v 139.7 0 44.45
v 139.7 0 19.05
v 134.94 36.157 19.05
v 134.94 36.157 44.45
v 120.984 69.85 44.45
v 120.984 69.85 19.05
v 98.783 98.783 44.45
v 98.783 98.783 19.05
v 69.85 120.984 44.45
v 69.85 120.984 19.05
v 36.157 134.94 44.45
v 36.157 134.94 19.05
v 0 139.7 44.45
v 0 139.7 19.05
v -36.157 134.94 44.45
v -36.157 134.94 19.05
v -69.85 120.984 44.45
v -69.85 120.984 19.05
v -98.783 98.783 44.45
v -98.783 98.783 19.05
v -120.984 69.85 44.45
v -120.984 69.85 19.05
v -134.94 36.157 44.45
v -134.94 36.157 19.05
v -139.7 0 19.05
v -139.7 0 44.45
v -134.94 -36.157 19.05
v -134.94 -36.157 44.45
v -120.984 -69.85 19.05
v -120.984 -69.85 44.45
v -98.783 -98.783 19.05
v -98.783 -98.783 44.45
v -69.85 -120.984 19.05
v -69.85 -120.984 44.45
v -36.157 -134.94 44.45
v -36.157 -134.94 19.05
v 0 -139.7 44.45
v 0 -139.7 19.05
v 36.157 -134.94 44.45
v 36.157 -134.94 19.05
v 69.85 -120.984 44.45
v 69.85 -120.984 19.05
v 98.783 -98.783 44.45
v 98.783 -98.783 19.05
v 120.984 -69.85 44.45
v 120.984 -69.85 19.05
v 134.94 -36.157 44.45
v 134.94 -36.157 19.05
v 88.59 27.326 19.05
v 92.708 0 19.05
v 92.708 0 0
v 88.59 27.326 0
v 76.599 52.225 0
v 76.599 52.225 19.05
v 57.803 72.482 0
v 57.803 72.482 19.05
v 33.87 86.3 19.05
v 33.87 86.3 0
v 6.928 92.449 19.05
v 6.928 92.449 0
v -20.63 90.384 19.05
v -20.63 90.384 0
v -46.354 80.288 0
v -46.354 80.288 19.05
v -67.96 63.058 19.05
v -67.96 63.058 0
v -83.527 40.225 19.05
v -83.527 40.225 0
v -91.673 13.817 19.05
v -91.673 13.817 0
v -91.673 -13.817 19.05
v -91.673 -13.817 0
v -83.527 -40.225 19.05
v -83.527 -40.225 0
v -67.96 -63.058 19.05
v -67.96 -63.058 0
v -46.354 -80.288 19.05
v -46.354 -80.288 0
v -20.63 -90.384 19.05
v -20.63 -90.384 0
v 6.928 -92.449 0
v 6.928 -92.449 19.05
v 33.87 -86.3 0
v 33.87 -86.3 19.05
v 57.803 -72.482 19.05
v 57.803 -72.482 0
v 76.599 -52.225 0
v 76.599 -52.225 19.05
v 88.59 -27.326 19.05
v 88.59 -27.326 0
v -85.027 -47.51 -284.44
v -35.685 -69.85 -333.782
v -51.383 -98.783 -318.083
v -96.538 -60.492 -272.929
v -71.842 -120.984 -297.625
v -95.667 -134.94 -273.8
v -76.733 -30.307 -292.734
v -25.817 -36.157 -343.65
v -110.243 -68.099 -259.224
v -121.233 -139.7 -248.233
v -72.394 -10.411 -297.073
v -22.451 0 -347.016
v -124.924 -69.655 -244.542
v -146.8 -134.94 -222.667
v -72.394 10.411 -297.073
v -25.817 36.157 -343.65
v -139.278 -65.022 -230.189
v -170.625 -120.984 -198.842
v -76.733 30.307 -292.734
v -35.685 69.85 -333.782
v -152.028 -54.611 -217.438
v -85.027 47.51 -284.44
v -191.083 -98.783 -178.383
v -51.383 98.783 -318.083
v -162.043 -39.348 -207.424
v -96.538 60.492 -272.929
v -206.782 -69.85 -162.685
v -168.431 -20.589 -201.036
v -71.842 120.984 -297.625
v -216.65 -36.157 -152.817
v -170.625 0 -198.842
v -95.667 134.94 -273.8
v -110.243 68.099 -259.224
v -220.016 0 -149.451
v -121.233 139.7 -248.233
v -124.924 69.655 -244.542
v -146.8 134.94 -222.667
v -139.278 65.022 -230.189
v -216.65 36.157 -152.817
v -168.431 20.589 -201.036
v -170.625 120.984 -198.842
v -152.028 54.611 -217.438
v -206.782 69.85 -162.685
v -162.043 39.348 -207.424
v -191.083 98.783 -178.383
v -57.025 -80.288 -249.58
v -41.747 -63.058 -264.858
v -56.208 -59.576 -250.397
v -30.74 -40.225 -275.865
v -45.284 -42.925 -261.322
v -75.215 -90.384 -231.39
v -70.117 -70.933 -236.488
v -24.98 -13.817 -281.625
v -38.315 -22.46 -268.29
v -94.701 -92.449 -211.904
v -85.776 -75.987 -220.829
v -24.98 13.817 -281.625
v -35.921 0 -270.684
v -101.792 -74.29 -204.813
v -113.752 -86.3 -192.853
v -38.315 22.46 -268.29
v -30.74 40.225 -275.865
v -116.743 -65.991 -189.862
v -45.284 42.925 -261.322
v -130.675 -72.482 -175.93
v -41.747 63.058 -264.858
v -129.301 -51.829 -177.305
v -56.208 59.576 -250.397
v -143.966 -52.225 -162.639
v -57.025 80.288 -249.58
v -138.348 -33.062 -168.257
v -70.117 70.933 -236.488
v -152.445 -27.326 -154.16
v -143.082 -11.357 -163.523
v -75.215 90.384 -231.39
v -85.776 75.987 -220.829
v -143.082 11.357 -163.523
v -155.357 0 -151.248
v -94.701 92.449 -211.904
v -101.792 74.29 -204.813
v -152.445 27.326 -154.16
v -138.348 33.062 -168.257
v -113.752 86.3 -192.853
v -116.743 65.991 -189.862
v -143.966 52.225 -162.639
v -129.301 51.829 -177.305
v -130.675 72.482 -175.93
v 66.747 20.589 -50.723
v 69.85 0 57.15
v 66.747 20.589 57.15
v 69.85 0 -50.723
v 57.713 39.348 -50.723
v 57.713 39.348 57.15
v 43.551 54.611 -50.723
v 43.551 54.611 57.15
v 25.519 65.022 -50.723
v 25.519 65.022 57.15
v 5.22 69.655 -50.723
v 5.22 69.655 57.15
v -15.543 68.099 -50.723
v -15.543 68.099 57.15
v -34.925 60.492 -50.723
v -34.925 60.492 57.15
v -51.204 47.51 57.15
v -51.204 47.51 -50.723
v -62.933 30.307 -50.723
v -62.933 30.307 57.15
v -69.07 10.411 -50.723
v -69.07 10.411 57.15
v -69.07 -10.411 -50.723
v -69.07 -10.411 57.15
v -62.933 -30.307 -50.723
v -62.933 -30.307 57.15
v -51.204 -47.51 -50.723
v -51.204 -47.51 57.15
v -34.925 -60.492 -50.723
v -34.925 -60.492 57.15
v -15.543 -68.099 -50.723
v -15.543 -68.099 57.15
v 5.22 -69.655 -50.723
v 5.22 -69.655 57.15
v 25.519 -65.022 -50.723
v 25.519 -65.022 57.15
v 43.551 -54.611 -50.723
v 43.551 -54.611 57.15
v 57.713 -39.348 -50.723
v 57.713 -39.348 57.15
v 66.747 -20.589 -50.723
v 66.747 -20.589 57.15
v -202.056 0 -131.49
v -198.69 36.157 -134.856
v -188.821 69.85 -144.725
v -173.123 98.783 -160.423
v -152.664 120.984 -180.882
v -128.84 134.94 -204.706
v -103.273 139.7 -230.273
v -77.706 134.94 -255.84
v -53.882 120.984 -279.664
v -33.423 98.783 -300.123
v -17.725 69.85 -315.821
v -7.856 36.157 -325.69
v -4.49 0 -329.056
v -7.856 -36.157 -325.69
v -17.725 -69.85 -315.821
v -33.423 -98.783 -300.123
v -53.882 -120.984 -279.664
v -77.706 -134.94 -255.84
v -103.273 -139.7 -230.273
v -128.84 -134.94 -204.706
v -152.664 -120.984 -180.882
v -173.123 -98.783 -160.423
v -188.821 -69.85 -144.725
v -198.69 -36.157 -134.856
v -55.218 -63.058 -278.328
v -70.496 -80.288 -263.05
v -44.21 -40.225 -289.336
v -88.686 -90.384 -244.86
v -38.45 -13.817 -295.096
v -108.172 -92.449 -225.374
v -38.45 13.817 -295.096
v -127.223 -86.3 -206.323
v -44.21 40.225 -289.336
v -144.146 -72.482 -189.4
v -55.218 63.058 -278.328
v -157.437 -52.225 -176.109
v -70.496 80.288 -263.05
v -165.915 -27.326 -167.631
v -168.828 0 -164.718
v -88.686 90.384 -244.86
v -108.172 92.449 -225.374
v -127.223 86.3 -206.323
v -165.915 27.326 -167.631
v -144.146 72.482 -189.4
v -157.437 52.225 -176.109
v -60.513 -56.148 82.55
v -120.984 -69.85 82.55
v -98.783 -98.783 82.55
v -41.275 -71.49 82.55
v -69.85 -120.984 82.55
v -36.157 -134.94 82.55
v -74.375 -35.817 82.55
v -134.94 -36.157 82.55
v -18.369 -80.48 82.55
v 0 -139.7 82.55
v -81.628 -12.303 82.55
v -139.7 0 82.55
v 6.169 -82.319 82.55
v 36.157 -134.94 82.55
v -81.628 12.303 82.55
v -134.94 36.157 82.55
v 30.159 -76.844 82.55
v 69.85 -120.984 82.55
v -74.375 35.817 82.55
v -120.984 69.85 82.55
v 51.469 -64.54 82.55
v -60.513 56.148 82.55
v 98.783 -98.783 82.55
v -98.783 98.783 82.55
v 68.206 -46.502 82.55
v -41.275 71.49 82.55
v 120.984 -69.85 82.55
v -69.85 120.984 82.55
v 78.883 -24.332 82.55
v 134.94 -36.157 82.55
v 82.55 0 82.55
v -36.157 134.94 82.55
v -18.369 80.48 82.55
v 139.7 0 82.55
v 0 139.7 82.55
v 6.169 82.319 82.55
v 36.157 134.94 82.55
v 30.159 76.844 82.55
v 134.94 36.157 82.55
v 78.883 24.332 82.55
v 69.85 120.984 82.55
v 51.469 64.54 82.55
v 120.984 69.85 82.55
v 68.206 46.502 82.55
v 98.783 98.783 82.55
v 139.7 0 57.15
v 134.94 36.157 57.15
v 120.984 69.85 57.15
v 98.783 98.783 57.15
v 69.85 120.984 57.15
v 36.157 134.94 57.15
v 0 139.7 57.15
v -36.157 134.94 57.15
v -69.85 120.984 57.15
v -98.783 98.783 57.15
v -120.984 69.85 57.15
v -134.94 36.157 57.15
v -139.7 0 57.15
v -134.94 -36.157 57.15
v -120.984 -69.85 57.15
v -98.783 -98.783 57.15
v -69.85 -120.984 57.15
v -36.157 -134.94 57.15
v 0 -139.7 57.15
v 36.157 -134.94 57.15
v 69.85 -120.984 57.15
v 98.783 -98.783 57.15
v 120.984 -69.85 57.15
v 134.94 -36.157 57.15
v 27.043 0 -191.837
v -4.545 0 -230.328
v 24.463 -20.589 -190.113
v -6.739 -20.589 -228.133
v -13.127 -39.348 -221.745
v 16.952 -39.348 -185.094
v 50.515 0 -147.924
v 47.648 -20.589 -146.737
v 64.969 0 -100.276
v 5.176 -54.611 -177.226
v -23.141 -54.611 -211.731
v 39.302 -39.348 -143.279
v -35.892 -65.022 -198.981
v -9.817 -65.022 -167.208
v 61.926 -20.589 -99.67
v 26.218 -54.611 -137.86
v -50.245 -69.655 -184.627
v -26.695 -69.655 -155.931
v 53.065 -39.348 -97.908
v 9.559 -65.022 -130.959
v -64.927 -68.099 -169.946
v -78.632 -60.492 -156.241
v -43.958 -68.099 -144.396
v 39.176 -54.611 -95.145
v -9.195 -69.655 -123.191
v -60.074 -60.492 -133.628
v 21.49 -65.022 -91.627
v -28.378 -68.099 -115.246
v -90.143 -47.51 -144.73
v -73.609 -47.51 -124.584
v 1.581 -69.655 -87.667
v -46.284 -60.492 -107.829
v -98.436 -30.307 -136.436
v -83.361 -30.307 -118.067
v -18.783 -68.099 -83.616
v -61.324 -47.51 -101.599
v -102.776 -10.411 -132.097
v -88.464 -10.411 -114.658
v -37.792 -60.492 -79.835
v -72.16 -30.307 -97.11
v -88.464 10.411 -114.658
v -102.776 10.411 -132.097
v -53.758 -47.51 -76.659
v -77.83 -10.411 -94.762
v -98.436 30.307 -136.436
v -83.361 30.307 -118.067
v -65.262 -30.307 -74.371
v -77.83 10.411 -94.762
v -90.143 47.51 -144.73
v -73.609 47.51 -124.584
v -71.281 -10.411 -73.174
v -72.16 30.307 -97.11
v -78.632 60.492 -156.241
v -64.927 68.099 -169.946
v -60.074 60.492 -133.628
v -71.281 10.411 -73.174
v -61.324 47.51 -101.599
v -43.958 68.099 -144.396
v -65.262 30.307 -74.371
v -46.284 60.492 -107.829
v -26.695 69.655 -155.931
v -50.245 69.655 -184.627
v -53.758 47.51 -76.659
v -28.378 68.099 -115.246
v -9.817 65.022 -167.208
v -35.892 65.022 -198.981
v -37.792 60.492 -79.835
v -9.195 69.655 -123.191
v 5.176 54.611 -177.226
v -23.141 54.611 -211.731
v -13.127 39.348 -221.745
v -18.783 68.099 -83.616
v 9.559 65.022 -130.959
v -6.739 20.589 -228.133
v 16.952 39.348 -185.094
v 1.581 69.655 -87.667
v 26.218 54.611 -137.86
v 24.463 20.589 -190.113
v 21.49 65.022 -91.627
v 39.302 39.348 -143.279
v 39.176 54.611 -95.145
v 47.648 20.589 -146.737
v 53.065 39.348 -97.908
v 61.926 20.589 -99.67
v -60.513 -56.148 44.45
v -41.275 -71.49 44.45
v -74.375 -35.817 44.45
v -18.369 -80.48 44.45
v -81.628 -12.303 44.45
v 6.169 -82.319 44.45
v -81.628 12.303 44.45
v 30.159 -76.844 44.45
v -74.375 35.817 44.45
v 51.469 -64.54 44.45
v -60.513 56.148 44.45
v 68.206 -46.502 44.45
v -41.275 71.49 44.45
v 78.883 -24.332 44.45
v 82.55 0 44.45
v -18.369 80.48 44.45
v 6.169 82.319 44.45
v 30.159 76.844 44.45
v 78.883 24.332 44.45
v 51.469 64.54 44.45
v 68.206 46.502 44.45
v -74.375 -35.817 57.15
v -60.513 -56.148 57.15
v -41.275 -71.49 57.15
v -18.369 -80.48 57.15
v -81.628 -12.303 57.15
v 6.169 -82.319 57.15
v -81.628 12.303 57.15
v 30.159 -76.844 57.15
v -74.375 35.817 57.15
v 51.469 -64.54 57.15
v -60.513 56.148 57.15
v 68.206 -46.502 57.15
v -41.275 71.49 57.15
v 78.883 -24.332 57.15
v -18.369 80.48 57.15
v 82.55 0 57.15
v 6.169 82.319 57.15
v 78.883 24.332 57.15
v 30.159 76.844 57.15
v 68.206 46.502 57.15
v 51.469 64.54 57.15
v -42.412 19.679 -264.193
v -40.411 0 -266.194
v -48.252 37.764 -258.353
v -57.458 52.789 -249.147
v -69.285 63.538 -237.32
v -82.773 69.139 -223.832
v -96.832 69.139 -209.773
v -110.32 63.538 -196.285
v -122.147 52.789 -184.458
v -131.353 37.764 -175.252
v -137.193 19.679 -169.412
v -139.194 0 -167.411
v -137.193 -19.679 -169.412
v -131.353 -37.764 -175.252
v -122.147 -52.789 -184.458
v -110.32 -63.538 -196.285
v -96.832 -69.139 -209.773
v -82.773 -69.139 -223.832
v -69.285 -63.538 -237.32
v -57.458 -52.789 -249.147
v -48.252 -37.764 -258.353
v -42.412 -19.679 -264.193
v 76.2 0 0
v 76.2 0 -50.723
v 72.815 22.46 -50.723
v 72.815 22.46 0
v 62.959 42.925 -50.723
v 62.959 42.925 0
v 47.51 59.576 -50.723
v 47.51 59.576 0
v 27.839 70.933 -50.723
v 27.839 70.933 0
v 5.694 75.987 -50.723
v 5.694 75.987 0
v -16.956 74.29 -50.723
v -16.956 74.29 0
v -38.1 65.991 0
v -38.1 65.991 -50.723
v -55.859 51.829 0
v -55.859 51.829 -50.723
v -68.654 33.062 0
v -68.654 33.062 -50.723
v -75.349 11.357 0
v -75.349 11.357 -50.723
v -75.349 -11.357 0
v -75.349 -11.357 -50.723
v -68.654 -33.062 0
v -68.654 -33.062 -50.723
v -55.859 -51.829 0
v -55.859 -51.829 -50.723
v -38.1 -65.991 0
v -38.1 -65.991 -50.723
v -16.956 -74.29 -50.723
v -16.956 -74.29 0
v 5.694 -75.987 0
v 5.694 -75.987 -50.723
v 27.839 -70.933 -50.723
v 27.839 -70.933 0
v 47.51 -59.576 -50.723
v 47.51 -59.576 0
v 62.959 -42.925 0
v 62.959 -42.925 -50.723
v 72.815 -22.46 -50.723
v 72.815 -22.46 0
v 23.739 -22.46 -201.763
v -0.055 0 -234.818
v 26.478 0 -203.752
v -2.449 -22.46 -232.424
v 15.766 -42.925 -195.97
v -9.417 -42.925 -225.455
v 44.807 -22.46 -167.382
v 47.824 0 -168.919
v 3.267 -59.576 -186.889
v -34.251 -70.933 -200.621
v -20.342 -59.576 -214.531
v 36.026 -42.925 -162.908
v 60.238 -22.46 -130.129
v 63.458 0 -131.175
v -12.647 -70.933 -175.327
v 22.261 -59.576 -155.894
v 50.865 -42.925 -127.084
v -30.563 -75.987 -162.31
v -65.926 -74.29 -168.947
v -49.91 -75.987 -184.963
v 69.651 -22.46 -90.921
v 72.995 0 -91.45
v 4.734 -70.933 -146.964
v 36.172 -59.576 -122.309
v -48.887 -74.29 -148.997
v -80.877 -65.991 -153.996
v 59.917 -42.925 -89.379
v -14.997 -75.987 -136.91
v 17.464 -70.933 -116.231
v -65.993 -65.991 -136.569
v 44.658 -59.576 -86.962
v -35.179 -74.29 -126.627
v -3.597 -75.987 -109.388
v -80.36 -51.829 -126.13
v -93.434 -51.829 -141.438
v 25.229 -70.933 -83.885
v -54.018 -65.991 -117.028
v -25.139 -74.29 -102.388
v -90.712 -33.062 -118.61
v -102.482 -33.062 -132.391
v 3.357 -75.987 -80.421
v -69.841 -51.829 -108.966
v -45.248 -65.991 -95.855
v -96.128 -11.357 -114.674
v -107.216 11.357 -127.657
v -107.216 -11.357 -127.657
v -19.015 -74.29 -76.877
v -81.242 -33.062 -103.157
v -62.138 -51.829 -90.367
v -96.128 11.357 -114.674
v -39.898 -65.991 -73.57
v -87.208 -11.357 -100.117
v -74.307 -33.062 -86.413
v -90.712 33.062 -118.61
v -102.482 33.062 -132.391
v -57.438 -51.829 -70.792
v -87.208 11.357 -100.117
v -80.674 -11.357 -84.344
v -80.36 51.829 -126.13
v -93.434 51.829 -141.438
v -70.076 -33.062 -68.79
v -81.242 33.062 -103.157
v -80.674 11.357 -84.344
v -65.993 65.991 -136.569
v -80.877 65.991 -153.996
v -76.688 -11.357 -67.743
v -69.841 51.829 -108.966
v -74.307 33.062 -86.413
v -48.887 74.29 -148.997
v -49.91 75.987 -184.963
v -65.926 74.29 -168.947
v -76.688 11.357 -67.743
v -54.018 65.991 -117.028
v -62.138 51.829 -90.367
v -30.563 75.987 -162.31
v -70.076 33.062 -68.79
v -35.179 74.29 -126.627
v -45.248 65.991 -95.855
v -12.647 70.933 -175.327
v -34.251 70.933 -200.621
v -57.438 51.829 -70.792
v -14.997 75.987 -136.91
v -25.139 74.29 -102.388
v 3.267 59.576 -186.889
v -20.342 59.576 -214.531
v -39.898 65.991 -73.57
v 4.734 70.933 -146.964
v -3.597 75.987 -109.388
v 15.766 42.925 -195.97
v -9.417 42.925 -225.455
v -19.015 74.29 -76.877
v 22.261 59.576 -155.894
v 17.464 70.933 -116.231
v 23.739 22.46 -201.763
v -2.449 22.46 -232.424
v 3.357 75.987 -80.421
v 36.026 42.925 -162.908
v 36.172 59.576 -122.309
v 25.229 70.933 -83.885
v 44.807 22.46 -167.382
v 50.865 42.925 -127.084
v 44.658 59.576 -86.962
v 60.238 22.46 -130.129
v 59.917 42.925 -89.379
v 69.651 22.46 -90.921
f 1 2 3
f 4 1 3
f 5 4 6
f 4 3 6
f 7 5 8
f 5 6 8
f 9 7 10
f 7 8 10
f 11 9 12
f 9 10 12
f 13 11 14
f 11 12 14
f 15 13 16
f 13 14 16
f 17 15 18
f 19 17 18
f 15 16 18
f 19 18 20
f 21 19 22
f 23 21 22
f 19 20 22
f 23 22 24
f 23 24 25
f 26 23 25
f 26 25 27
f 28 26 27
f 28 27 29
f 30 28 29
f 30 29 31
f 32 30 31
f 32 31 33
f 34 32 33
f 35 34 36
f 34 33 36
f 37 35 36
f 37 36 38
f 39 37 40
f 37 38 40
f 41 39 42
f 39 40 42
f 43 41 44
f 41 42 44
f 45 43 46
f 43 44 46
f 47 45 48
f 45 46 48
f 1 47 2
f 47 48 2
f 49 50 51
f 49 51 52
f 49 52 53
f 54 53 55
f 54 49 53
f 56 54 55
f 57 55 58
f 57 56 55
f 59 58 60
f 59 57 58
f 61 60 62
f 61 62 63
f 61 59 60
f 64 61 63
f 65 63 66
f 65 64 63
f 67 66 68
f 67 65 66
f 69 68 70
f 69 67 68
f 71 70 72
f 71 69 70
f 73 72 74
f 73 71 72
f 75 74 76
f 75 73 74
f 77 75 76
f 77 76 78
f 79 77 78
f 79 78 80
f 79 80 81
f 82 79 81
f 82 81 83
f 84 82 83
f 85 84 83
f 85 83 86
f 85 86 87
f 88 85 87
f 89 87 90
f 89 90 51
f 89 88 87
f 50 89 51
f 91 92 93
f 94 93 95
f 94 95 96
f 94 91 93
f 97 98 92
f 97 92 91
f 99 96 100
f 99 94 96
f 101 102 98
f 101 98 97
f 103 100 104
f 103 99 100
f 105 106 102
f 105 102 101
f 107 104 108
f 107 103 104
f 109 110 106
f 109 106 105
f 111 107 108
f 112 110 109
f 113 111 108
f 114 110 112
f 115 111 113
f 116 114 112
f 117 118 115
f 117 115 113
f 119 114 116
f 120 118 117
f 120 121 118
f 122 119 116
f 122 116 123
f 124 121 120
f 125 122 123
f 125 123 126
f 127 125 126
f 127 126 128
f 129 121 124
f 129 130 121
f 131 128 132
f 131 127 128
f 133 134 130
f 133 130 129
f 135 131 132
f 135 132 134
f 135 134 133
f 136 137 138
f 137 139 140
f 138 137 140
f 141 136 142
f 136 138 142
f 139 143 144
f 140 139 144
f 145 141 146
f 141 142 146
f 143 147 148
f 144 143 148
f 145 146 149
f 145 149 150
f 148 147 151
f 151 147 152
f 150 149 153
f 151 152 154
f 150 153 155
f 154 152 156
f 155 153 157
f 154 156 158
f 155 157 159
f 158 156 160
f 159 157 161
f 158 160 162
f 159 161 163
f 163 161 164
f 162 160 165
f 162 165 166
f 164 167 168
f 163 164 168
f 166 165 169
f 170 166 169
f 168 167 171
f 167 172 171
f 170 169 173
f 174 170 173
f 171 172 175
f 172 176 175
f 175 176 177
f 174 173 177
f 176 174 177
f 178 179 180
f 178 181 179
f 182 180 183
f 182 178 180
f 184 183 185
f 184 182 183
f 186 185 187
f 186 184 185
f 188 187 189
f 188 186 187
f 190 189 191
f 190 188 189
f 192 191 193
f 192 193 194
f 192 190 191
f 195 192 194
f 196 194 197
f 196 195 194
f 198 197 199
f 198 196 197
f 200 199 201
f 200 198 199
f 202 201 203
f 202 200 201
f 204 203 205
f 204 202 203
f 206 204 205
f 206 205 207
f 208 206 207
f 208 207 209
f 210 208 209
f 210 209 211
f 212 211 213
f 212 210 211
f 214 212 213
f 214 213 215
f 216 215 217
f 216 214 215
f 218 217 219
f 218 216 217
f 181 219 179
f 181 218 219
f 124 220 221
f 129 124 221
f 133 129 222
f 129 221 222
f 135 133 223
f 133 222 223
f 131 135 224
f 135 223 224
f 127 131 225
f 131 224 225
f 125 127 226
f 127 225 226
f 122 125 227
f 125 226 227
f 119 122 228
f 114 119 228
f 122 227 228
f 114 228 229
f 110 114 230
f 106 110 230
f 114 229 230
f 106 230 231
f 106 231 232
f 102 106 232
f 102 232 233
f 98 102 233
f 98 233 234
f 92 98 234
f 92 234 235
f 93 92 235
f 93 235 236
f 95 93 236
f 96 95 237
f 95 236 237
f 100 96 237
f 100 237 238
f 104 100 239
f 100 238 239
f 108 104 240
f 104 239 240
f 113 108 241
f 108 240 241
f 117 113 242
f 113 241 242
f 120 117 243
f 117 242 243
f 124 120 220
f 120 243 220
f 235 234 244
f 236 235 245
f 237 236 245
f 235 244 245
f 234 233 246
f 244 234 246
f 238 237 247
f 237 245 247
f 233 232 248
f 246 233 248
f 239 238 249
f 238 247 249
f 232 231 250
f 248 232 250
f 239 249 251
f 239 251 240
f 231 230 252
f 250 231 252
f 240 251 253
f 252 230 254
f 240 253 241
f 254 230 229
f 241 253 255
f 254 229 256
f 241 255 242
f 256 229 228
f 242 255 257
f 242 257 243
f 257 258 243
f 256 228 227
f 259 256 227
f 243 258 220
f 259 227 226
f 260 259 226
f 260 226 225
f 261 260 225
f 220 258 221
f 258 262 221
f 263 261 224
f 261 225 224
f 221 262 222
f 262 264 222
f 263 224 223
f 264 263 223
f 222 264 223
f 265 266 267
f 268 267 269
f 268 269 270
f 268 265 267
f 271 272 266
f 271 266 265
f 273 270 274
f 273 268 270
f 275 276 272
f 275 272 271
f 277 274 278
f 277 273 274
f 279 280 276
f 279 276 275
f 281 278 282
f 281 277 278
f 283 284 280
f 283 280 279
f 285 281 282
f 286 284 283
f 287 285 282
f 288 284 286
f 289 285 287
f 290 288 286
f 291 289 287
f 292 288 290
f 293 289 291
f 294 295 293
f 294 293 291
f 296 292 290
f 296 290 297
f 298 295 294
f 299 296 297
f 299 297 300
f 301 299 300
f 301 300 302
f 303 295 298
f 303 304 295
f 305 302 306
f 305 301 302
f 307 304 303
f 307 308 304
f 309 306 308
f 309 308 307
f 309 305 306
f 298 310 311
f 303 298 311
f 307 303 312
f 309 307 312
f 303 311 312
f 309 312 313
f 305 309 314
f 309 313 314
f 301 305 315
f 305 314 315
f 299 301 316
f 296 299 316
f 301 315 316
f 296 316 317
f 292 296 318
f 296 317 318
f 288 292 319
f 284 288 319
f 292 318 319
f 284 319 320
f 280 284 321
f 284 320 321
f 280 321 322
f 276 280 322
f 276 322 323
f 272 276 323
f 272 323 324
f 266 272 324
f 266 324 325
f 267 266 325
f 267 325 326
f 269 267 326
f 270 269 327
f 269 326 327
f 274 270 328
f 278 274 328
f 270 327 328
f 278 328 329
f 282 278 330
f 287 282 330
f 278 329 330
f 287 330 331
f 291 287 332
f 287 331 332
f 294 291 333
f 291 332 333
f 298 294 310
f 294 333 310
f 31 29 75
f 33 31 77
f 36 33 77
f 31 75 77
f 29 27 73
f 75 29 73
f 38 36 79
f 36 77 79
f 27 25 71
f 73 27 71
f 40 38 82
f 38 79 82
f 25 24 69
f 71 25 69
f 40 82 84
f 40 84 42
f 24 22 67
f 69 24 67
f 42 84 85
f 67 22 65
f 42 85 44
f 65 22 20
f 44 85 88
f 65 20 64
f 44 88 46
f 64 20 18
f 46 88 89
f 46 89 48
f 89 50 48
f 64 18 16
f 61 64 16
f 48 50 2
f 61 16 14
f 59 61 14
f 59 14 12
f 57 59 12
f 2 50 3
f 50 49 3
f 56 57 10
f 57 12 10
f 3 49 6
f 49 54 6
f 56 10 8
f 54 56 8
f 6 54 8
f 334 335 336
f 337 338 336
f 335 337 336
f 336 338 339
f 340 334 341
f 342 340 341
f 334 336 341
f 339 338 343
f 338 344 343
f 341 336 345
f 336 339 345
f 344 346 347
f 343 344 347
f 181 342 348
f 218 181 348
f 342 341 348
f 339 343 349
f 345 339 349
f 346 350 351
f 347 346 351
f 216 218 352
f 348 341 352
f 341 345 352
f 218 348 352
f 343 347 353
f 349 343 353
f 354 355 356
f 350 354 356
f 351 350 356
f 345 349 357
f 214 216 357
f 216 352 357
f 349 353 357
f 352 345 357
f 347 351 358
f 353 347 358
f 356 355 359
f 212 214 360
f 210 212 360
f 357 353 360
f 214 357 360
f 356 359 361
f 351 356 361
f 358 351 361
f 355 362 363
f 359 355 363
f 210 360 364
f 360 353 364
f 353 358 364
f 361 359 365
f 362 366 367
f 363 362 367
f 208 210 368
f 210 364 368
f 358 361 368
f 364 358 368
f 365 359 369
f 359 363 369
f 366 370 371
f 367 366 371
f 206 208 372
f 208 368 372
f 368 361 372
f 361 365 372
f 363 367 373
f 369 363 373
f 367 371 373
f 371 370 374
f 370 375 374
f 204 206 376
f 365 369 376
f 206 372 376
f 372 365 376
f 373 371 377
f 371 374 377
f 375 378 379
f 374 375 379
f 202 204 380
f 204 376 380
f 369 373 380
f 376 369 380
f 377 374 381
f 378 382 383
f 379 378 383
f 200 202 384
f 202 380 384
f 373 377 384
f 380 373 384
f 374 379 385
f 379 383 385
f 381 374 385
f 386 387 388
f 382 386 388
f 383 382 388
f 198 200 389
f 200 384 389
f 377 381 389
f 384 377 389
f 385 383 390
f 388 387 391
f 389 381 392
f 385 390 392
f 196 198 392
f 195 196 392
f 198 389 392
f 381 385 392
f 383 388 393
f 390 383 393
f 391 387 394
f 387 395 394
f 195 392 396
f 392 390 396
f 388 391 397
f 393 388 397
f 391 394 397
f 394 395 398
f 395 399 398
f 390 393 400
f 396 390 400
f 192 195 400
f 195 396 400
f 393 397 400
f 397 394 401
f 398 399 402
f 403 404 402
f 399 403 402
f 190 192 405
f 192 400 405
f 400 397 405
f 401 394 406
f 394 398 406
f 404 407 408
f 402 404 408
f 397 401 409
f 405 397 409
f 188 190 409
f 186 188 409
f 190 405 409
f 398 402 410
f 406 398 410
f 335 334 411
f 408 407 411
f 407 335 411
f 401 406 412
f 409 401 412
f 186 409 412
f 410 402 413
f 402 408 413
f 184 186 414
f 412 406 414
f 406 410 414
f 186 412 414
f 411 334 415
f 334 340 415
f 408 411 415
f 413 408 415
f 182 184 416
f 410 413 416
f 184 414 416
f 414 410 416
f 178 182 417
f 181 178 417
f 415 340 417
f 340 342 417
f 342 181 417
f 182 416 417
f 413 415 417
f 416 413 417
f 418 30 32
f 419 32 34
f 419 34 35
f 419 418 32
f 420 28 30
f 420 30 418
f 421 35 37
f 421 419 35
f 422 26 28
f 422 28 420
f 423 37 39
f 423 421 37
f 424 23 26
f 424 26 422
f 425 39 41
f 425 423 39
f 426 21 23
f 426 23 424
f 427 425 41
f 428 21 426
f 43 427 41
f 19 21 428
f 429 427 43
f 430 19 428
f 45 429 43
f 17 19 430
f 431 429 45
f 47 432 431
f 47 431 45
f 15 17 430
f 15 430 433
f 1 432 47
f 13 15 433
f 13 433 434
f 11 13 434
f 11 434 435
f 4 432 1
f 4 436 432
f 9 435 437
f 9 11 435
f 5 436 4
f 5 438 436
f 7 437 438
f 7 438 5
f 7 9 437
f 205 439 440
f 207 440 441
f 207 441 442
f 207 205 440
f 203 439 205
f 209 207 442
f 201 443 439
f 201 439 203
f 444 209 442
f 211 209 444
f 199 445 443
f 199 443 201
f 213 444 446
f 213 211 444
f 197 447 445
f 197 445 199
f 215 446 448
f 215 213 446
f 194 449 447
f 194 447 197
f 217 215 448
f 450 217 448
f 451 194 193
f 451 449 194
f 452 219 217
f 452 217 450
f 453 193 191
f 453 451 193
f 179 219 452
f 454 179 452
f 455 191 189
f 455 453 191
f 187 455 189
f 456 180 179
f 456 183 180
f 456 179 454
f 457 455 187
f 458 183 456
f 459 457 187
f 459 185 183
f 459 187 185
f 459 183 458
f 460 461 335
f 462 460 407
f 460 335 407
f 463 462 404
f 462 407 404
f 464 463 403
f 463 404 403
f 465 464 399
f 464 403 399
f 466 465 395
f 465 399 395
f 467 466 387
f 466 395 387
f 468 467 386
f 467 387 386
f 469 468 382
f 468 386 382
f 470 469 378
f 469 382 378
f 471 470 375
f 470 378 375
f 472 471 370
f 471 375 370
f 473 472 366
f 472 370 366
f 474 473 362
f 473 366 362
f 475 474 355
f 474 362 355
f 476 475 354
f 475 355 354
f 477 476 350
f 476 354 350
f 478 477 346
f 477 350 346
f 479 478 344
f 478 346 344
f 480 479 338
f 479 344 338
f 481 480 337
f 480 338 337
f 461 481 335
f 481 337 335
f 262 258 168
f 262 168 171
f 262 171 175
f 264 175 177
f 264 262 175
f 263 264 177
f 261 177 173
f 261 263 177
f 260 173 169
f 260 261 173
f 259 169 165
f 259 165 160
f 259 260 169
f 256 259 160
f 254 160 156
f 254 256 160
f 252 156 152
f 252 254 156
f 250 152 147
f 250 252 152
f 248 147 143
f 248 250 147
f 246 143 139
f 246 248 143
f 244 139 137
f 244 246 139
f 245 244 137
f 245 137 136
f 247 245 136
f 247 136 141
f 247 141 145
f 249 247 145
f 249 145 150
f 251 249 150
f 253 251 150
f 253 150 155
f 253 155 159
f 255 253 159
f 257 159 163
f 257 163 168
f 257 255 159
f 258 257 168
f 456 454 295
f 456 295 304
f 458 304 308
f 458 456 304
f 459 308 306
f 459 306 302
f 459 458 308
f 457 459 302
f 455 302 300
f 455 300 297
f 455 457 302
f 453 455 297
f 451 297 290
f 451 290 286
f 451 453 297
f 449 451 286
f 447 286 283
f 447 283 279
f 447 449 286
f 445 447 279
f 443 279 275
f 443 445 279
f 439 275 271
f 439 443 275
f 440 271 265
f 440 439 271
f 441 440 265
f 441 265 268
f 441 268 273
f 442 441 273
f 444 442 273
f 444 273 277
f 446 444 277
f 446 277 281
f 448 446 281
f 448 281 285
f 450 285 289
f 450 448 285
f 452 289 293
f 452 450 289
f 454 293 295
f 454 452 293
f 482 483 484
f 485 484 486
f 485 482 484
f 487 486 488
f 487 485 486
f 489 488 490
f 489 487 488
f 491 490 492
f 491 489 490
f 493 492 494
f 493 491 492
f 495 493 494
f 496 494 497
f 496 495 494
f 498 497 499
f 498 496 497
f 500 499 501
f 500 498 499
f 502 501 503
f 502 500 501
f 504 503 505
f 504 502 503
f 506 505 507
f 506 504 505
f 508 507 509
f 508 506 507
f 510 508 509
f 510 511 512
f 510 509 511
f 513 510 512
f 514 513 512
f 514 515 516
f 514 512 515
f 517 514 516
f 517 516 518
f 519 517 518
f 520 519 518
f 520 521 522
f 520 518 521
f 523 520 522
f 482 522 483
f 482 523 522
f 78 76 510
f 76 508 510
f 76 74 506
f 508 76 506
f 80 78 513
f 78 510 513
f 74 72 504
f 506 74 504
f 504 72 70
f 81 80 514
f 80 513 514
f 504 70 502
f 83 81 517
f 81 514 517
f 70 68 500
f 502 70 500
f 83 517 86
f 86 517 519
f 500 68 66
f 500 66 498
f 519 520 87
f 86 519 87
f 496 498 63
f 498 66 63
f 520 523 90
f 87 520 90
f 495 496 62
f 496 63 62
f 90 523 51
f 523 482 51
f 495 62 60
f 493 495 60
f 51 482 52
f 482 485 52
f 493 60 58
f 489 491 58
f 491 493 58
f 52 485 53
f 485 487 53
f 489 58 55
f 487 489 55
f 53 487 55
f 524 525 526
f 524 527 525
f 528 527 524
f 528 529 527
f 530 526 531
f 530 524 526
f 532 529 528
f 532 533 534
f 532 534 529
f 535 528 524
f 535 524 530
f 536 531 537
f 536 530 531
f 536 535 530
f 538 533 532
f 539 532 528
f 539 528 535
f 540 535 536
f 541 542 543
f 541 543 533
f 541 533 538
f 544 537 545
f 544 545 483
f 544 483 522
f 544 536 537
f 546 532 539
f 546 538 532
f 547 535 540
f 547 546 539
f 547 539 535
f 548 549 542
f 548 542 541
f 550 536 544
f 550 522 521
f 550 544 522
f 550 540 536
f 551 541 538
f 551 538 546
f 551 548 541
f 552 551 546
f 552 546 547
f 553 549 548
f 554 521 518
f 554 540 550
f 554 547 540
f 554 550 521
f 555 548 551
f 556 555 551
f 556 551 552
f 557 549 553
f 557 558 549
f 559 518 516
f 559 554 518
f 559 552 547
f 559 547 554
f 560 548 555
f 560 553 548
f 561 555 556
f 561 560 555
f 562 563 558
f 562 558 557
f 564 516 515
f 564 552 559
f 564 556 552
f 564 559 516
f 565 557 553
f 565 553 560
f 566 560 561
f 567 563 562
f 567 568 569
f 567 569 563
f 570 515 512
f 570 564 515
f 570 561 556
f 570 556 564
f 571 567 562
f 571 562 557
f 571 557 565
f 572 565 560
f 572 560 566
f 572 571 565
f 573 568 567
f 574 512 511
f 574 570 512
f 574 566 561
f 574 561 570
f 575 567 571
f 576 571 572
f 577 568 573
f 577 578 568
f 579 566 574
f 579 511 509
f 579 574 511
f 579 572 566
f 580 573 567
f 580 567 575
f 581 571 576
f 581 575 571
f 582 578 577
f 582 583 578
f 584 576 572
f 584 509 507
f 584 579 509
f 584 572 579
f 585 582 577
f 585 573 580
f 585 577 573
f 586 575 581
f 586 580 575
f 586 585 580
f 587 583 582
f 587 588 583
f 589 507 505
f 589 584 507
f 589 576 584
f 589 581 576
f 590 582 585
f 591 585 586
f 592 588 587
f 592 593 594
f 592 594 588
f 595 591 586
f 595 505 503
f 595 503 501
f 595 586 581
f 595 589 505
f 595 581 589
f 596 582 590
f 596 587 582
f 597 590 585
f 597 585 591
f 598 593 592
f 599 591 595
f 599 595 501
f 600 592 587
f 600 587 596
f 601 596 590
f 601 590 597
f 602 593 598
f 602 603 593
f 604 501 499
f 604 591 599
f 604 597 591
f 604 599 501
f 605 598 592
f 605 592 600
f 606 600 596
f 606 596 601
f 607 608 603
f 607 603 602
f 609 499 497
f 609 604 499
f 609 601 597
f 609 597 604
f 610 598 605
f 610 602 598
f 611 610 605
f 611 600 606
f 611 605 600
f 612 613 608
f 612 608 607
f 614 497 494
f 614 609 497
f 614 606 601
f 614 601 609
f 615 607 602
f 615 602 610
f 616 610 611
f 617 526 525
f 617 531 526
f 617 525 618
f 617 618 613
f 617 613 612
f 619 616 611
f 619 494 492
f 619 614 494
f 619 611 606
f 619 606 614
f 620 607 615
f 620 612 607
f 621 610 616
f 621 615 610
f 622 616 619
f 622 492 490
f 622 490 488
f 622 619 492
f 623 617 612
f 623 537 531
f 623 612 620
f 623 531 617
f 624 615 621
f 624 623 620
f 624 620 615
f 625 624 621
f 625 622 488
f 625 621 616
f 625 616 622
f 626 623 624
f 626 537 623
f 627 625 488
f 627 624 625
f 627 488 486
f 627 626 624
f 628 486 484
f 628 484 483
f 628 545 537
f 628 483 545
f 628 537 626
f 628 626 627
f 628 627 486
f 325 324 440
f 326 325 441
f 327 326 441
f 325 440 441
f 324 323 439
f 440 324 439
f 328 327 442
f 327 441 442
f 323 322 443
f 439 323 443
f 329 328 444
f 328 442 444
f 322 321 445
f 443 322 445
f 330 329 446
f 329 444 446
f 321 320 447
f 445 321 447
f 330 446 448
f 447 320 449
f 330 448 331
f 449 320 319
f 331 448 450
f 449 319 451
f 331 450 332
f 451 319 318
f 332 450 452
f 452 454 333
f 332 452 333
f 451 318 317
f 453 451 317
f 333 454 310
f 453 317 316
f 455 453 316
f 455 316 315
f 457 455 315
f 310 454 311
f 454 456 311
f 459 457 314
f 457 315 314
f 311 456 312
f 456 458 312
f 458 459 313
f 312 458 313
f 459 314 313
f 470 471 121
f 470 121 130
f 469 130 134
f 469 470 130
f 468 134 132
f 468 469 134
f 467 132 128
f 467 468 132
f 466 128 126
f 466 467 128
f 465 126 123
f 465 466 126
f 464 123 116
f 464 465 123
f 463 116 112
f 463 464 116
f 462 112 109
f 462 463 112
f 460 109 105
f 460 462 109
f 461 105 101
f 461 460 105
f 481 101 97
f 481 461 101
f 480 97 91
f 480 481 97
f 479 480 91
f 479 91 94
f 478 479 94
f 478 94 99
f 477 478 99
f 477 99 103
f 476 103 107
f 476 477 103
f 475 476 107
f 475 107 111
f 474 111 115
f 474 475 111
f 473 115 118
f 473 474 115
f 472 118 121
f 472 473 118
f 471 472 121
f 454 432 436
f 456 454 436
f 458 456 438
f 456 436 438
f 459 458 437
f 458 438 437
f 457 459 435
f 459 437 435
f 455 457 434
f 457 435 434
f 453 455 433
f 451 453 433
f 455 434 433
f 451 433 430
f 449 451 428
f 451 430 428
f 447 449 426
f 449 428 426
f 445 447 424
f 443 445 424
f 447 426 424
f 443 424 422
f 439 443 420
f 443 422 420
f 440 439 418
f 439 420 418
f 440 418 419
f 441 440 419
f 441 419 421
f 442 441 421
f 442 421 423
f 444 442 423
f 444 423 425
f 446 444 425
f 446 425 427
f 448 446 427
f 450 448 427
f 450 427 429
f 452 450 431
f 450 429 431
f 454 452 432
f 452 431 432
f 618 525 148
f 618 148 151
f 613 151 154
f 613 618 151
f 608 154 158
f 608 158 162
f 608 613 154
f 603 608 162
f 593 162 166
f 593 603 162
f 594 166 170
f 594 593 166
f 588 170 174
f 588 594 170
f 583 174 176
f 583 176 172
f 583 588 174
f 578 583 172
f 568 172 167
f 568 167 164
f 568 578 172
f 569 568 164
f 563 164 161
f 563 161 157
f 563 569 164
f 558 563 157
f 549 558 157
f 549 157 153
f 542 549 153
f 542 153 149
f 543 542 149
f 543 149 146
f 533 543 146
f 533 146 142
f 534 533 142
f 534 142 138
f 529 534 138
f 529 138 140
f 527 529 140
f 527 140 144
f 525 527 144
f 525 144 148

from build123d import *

# Parameters (mm, degrees)
F0_R      = 76.2
F0_R_2    = 69.85
F1_DEPTH  = 19.05
F2_R      = 139.7
F2_R_2    = 92.7084880465
F2_R_3    = 76.2
F2_R_4    = 69.85
F3_DEPTH  = 25.4
F4_DEPTH  = 19.05
F9_ANGLE  = 135
F10_R     = 82.55
F10_R_2   = 69.85
F11_DEPTH = 12.7
F12_R     = 139.7
F12_R_2   = 82.55
F13_DEPTH = 25.4


with BuildPart() as f1:
    # F0 (on Top) → F1 (new body)
    with BuildSketch(Plane.XY):
        Circle(F0_R)
        Circle(F0_R_2, mode=Mode.SUBTRACT)
    extrude(amount=F1_DEPTH)

    # F2 (on face) → F3 (join)
    with BuildSketch(Plane.XY.offset(19.05)):
        Circle(F2_R)
        Circle(F2_R_2, mode=Mode.SUBTRACT)
        Circle(F2_R_2)
        Circle(F2_R_3, mode=Mode.SUBTRACT)
        Circle(F2_R_3)
        Circle(F2_R_4, mode=Mode.SUBTRACT)
    extrude(amount=F3_DEPTH)

    # F2 (on face) → F4 (join)
    with BuildSketch(Plane.XY.offset(19.05)):
        Circle(F2_R_2)
        Circle(F2_R_3, mode=Mode.SUBTRACT)
    extrude(amount=-F4_DEPTH)


with BuildPart() as f6:
    # F6: sweep along a path in F5
    with BuildLine(Plane.XZ) as f6_path:
        Line((-89.8025612107, -216.8025612107), (-53.9362862445, -180.9362862445))
        ThreePointArc((-53.9362862445, -180.9362862445), (-14.017584088, -121.193726559), (0, -50.722572489))
        Line((0, -50.722572489), (0, 0))
    # F0 (on Top) → F6 (sweep)
    with BuildSketch(Plane.XY):
        Circle(F0_R)
        Circle(F0_R_2, mode=Mode.SUBTRACT)
    sweep(path=f6_path.line)


with BuildPart() as f8_1:
    # F8: copy of F1
    add(f1.part.moved(Location((-89.8025612107, 0, -216.8025612107))))


with BuildPart() as f8_1_1:
    # F9: moved
    add(f8_1.part.rotate(Axis((-89.8025612107, -171.9250977039, -216.8025612107), (0, -1, 0)), F9_ANGLE))


with BuildPart() as f1_1:
    add(f1.part)

    add(f6.part)  # F11 merges F6

    add(f8_1_1.part)  # F11 merges F8_1
    # F10 (on face) → F11 (join)
    with BuildSketch(Plane.XY.offset(44.45)):
        Circle(F10_R)
        Circle(F10_R_2, mode=Mode.SUBTRACT)
    extrude(amount=F11_DEPTH)

    # F12 (on face) → F13 (join)
    with BuildSketch(Plane.XY.offset(57.15)):
        Circle(F12_R)
        Circle(F12_R_2, mode=Mode.SUBTRACT)
    extrude(amount=F13_DEPTH)


solid = f1_1.part
